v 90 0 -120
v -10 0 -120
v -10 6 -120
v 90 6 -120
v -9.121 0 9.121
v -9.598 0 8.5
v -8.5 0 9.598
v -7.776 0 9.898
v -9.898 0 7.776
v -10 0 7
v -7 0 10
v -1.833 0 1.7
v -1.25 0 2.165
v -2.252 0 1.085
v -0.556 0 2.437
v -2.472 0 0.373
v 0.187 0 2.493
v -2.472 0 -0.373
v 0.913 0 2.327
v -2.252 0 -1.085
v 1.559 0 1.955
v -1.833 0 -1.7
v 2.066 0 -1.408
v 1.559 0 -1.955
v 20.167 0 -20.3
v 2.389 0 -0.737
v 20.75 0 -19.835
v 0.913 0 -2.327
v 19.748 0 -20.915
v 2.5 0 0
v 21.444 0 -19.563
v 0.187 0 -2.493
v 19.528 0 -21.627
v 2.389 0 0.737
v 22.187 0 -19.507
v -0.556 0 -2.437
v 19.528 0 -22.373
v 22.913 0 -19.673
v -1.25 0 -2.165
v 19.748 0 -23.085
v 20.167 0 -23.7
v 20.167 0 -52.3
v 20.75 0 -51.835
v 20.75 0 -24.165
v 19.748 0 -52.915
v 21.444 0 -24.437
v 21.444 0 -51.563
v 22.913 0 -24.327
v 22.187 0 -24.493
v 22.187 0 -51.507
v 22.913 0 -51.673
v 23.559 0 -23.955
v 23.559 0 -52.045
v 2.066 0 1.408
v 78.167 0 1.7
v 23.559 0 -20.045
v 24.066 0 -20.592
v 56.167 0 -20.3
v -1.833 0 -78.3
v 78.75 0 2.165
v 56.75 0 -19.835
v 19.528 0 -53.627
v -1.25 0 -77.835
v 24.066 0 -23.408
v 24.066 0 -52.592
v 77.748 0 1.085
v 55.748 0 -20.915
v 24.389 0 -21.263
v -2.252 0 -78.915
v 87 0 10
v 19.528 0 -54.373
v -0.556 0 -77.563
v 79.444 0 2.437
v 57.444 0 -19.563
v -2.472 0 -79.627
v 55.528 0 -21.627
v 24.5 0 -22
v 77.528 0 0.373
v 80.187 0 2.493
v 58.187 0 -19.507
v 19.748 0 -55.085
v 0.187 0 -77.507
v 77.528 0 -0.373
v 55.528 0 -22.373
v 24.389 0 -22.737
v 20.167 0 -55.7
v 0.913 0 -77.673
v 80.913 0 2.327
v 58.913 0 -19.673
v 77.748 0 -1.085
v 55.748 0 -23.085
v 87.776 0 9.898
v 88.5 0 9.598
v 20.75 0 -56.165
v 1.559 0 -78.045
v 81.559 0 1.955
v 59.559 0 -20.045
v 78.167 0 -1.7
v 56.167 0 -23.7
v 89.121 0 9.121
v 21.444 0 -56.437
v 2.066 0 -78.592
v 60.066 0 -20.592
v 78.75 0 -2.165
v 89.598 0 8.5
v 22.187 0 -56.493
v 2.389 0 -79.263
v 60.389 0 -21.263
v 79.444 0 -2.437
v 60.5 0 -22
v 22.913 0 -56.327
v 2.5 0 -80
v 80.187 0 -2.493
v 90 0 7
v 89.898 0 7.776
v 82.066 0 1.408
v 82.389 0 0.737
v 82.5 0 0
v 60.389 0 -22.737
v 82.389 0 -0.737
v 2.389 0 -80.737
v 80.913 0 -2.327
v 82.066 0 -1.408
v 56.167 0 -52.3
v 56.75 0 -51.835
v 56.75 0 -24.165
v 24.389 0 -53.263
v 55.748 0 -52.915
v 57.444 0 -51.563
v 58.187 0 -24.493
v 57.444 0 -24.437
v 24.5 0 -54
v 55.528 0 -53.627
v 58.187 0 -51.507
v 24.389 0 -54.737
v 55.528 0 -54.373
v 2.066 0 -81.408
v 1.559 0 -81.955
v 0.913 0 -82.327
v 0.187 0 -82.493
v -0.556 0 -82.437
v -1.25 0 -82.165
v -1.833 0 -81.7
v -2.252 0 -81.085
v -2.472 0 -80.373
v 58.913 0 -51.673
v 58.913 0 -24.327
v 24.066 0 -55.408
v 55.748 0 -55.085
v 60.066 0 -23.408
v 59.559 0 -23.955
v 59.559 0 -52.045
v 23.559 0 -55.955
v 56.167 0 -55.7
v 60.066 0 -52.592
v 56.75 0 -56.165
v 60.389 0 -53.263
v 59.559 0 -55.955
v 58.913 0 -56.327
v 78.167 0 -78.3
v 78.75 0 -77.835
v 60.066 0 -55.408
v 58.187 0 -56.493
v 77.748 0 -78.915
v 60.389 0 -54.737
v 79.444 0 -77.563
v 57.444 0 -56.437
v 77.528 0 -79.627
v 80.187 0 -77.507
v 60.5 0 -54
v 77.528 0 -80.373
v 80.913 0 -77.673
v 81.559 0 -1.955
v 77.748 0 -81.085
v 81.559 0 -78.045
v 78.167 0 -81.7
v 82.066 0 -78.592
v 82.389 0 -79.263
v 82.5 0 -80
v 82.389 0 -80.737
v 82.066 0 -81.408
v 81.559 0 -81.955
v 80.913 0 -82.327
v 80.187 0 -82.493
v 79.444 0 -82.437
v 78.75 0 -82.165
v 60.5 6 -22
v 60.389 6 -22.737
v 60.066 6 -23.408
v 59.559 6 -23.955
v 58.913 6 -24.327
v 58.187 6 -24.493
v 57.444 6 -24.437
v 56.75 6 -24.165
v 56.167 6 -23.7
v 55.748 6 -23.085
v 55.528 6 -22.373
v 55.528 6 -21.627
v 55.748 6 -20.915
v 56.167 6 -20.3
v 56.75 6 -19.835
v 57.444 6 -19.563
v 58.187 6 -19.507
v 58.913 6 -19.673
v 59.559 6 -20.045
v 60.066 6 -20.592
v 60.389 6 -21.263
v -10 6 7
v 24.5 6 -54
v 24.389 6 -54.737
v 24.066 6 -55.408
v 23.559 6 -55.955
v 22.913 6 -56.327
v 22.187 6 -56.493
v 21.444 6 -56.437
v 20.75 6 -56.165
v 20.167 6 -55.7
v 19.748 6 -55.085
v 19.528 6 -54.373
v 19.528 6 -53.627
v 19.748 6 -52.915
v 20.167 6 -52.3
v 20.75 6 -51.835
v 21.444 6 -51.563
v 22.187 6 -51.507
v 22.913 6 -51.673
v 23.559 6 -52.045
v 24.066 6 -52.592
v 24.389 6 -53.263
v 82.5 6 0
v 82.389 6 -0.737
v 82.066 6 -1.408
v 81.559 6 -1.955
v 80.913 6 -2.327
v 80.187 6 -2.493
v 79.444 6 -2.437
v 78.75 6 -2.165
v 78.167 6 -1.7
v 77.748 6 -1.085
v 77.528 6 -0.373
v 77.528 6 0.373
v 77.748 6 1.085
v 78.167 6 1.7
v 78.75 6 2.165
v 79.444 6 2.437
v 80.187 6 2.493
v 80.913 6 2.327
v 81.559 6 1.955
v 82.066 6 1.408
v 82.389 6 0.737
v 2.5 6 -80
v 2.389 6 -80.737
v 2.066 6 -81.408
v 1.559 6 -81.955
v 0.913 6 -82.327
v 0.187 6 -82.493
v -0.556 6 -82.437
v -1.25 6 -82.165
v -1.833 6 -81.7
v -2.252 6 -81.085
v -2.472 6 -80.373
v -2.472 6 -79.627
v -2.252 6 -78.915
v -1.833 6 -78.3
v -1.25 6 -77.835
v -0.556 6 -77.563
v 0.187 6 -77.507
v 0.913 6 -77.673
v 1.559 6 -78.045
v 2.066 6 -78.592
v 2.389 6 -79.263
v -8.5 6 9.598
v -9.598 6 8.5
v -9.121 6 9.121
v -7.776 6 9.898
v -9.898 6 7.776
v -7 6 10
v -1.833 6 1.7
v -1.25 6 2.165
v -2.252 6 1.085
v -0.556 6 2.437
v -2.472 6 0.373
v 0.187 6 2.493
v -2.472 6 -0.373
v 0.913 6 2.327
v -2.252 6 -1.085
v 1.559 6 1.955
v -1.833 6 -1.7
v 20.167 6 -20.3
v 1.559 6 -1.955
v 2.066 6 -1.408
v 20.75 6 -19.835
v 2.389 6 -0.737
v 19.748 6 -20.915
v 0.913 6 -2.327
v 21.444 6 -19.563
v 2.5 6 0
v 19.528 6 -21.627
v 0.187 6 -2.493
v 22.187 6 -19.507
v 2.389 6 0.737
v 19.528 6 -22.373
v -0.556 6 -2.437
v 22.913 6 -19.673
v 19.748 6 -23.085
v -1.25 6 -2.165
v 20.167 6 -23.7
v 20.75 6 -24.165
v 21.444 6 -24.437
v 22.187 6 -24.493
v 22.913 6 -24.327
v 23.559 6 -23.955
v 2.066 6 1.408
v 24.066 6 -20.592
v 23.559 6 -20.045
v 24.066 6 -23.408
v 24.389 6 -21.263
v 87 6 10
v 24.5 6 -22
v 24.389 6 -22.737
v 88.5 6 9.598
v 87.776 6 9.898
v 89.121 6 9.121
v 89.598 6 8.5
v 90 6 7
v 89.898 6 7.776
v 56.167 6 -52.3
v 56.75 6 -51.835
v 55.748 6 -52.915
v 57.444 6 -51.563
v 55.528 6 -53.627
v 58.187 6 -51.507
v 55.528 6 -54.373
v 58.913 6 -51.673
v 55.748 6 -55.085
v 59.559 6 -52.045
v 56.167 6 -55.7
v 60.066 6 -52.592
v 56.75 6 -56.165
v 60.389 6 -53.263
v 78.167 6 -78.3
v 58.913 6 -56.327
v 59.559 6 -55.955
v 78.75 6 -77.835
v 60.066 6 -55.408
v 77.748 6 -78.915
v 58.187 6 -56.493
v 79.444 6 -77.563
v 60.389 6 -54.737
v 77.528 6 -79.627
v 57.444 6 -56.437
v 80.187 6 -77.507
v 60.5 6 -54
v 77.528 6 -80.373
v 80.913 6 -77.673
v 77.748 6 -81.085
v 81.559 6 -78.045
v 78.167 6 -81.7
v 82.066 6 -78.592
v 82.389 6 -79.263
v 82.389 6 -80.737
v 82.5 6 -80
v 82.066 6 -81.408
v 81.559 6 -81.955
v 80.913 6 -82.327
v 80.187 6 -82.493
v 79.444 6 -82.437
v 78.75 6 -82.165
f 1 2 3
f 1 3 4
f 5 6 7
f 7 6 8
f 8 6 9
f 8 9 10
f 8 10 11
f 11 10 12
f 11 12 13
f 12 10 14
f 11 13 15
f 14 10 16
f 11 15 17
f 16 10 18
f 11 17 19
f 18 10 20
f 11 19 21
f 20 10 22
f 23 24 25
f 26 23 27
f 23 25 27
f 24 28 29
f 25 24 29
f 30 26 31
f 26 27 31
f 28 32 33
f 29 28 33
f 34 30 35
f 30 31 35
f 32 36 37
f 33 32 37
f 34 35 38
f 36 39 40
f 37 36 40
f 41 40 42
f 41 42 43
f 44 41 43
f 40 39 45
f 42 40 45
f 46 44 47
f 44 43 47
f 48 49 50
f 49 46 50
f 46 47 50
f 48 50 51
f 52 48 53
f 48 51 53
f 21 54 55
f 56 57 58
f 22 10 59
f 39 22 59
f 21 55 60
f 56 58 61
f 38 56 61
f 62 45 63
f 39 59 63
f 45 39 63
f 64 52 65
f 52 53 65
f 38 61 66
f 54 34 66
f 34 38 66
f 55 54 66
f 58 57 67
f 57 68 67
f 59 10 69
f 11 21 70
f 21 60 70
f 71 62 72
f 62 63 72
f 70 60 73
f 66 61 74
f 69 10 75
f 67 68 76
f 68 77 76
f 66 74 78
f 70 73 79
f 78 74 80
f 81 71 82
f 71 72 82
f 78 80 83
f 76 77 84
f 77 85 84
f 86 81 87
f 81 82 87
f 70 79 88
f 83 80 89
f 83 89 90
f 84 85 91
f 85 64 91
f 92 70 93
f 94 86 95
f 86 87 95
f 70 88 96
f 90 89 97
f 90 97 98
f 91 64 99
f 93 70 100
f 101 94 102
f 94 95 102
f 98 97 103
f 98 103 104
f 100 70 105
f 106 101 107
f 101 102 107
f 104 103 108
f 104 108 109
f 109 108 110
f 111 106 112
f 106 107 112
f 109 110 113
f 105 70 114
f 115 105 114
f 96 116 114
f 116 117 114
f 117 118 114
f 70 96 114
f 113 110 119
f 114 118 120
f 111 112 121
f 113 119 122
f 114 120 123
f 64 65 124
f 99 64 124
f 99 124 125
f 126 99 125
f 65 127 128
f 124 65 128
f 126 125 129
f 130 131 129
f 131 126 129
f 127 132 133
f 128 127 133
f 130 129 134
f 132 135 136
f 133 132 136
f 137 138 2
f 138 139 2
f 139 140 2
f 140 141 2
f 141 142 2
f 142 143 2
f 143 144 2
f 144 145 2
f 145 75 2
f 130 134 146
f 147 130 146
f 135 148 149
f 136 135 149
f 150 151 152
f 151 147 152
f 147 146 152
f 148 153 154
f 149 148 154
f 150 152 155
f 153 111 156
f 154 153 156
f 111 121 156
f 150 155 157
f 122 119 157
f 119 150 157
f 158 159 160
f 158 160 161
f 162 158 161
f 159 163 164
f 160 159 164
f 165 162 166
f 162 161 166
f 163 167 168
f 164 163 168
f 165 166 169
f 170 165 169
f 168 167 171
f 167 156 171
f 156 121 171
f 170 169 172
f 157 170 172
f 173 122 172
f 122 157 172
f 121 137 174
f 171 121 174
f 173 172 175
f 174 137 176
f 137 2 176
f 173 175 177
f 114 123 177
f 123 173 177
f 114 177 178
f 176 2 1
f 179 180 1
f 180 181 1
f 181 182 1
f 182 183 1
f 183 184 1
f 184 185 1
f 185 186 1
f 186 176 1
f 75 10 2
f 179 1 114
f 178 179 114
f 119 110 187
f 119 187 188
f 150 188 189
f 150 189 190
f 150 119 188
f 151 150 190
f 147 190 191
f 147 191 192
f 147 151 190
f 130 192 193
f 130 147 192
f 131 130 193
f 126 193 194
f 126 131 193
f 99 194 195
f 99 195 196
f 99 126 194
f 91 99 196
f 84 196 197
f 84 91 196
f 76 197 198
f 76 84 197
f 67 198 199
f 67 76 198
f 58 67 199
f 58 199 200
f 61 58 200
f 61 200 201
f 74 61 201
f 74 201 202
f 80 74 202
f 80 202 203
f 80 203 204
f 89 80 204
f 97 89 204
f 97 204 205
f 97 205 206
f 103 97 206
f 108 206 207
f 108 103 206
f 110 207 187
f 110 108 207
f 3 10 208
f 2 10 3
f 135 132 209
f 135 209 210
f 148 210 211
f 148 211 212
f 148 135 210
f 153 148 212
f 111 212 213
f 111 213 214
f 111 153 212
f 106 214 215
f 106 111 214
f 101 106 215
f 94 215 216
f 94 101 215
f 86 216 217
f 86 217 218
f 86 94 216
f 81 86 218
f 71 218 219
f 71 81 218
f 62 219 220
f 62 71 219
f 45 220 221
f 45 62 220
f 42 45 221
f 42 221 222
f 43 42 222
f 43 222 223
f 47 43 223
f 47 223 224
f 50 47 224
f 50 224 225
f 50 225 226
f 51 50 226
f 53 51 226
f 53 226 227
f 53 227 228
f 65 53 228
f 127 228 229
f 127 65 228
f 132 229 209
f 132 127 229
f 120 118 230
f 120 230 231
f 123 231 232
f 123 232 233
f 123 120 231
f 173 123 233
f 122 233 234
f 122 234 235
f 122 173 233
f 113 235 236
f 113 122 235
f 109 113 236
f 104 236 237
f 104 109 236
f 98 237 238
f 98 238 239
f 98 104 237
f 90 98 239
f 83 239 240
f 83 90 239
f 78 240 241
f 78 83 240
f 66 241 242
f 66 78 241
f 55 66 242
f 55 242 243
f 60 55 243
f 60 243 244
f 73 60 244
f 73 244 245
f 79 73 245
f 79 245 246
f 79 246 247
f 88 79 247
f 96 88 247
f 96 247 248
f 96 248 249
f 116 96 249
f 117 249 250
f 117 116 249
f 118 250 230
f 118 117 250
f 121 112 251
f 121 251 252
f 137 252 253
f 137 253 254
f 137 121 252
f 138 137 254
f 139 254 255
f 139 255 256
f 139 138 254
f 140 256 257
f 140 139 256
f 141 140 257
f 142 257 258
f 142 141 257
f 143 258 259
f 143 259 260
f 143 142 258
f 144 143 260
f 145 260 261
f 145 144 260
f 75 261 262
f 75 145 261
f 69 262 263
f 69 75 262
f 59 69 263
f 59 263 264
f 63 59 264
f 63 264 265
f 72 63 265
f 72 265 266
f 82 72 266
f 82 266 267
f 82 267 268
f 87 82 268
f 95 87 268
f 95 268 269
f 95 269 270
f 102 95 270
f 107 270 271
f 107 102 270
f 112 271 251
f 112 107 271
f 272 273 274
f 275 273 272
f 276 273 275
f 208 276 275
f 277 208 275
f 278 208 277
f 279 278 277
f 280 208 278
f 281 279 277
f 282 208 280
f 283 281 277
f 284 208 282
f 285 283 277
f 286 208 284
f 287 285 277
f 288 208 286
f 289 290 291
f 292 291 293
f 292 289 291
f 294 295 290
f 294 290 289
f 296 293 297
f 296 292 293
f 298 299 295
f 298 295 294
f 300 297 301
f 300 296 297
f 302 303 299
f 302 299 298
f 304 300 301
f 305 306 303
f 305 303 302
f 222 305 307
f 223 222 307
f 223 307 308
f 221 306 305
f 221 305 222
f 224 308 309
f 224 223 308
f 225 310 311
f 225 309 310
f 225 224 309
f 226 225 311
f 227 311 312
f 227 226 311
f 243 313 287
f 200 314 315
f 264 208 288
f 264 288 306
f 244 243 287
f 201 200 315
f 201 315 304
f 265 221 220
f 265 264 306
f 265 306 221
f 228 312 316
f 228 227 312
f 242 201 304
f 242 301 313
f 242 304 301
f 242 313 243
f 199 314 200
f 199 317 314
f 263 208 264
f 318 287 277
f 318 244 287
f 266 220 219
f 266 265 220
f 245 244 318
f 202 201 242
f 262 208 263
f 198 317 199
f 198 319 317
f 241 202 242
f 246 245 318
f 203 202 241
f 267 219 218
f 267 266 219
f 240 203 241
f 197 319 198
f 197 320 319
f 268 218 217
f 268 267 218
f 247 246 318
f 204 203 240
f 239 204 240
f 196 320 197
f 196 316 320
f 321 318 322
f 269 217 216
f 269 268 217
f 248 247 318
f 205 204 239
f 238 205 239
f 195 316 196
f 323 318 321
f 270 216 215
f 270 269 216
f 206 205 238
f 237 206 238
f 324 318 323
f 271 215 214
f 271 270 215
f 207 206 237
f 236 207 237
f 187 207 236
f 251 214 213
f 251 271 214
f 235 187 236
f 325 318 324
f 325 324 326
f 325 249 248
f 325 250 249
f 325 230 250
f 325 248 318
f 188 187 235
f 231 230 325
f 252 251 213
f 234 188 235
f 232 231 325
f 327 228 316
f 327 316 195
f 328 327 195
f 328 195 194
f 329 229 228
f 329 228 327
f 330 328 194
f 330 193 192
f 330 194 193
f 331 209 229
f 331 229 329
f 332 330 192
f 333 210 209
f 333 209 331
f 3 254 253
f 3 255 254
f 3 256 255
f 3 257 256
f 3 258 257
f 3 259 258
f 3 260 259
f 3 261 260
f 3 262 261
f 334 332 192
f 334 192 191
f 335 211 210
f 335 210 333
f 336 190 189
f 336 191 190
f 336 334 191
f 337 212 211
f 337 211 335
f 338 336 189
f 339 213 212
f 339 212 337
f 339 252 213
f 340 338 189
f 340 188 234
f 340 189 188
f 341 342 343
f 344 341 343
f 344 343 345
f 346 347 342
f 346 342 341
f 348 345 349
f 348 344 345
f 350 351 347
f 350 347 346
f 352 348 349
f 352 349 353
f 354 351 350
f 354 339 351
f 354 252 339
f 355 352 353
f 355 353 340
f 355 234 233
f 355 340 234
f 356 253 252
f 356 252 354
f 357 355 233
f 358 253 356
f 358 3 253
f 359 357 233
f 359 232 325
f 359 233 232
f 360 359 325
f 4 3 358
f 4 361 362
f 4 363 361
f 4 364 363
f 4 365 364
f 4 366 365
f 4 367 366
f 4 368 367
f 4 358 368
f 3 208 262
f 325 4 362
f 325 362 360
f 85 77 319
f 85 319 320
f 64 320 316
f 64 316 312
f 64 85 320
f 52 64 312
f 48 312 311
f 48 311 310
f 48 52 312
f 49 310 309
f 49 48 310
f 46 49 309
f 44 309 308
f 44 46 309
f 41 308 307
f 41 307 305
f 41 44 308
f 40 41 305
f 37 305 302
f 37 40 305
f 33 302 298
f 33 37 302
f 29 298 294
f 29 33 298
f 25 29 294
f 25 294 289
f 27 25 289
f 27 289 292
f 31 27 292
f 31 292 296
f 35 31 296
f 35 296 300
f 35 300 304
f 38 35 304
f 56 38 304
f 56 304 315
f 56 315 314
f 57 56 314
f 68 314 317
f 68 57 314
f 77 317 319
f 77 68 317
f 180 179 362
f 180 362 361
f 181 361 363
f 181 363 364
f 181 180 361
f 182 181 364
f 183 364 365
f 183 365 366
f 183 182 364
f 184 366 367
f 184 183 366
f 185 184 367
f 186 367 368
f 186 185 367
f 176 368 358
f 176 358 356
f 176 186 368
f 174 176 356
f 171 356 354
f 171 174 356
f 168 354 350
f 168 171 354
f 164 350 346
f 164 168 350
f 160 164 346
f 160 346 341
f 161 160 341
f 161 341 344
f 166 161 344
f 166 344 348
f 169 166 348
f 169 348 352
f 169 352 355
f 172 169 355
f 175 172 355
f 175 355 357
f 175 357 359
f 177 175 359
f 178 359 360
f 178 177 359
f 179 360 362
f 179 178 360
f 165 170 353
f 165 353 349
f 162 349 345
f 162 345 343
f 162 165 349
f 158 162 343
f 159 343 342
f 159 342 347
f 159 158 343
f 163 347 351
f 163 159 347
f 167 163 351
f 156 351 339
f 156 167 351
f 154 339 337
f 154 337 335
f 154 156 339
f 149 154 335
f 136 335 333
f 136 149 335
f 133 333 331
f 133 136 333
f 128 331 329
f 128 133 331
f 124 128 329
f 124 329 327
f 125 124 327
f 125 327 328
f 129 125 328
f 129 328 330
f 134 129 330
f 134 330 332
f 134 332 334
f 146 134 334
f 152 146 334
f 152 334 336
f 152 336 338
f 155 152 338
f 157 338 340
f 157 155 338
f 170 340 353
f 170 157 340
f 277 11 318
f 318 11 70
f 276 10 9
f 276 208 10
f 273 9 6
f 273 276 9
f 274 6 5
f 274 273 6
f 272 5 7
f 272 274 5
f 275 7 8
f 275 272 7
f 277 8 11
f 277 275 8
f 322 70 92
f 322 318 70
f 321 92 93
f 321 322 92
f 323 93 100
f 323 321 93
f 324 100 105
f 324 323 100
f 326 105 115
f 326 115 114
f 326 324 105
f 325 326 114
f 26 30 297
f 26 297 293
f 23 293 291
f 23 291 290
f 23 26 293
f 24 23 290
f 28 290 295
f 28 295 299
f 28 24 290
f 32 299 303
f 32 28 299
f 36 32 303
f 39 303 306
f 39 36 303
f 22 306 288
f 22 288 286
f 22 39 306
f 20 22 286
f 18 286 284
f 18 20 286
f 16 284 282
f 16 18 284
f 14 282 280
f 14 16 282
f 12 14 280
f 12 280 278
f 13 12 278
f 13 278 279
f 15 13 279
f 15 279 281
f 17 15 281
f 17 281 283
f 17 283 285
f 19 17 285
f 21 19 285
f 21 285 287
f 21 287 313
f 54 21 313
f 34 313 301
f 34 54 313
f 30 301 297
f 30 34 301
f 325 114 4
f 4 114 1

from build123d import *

# Parameters (mm, degrees)
SKETCH1_W           = 100
SKETCH1_H           = 130
SKETCH1_R           = 2.5
BOSS_EXTRUDE1_DEPTH = 6
FILLET1_R           = 3


with BuildPart() as part:
    # Sketch1 → Boss-Extrude1 (new body)
    with BuildSketch(Plane(origin=(0, 0, 0), x_dir=(1, 0, 0), z_dir=(0, 1, 0))):
        with Locations((40, 55)):
            Rectangle(SKETCH1_W, SKETCH1_H)
        Circle(SKETCH1_R, mode=Mode.SUBTRACT)
        with Locations((80, 0)):
            Circle(SKETCH1_R, mode=Mode.SUBTRACT)
        with Locations((0, 80)):
            Circle(SKETCH1_R, mode=Mode.SUBTRACT)
        with Locations((80, 80)):
            Circle(SKETCH1_R, mode=Mode.SUBTRACT)
        with Locations((22, 22)):
            Circle(SKETCH1_R, mode=Mode.SUBTRACT)
        with Locations((58, 22)):
            Circle(SKETCH1_R, mode=Mode.SUBTRACT)
        with Locations((22, 54)):
            Circle(SKETCH1_R, mode=Mode.SUBTRACT)
        with Locations((58, 54)):
            Circle(SKETCH1_R, mode=Mode.SUBTRACT)
    extrude(amount=BOSS_EXTRUDE1_DEPTH)

    # Fillet1
    fillet1_edges = [part.edges().sort_by_distance(p)[0] for p in [
        (90, 3, 10),
        (-10, 3, 10),
    ]]
    fillet(fillet1_edges, radius=FILLET1_R)


solid = part.part
